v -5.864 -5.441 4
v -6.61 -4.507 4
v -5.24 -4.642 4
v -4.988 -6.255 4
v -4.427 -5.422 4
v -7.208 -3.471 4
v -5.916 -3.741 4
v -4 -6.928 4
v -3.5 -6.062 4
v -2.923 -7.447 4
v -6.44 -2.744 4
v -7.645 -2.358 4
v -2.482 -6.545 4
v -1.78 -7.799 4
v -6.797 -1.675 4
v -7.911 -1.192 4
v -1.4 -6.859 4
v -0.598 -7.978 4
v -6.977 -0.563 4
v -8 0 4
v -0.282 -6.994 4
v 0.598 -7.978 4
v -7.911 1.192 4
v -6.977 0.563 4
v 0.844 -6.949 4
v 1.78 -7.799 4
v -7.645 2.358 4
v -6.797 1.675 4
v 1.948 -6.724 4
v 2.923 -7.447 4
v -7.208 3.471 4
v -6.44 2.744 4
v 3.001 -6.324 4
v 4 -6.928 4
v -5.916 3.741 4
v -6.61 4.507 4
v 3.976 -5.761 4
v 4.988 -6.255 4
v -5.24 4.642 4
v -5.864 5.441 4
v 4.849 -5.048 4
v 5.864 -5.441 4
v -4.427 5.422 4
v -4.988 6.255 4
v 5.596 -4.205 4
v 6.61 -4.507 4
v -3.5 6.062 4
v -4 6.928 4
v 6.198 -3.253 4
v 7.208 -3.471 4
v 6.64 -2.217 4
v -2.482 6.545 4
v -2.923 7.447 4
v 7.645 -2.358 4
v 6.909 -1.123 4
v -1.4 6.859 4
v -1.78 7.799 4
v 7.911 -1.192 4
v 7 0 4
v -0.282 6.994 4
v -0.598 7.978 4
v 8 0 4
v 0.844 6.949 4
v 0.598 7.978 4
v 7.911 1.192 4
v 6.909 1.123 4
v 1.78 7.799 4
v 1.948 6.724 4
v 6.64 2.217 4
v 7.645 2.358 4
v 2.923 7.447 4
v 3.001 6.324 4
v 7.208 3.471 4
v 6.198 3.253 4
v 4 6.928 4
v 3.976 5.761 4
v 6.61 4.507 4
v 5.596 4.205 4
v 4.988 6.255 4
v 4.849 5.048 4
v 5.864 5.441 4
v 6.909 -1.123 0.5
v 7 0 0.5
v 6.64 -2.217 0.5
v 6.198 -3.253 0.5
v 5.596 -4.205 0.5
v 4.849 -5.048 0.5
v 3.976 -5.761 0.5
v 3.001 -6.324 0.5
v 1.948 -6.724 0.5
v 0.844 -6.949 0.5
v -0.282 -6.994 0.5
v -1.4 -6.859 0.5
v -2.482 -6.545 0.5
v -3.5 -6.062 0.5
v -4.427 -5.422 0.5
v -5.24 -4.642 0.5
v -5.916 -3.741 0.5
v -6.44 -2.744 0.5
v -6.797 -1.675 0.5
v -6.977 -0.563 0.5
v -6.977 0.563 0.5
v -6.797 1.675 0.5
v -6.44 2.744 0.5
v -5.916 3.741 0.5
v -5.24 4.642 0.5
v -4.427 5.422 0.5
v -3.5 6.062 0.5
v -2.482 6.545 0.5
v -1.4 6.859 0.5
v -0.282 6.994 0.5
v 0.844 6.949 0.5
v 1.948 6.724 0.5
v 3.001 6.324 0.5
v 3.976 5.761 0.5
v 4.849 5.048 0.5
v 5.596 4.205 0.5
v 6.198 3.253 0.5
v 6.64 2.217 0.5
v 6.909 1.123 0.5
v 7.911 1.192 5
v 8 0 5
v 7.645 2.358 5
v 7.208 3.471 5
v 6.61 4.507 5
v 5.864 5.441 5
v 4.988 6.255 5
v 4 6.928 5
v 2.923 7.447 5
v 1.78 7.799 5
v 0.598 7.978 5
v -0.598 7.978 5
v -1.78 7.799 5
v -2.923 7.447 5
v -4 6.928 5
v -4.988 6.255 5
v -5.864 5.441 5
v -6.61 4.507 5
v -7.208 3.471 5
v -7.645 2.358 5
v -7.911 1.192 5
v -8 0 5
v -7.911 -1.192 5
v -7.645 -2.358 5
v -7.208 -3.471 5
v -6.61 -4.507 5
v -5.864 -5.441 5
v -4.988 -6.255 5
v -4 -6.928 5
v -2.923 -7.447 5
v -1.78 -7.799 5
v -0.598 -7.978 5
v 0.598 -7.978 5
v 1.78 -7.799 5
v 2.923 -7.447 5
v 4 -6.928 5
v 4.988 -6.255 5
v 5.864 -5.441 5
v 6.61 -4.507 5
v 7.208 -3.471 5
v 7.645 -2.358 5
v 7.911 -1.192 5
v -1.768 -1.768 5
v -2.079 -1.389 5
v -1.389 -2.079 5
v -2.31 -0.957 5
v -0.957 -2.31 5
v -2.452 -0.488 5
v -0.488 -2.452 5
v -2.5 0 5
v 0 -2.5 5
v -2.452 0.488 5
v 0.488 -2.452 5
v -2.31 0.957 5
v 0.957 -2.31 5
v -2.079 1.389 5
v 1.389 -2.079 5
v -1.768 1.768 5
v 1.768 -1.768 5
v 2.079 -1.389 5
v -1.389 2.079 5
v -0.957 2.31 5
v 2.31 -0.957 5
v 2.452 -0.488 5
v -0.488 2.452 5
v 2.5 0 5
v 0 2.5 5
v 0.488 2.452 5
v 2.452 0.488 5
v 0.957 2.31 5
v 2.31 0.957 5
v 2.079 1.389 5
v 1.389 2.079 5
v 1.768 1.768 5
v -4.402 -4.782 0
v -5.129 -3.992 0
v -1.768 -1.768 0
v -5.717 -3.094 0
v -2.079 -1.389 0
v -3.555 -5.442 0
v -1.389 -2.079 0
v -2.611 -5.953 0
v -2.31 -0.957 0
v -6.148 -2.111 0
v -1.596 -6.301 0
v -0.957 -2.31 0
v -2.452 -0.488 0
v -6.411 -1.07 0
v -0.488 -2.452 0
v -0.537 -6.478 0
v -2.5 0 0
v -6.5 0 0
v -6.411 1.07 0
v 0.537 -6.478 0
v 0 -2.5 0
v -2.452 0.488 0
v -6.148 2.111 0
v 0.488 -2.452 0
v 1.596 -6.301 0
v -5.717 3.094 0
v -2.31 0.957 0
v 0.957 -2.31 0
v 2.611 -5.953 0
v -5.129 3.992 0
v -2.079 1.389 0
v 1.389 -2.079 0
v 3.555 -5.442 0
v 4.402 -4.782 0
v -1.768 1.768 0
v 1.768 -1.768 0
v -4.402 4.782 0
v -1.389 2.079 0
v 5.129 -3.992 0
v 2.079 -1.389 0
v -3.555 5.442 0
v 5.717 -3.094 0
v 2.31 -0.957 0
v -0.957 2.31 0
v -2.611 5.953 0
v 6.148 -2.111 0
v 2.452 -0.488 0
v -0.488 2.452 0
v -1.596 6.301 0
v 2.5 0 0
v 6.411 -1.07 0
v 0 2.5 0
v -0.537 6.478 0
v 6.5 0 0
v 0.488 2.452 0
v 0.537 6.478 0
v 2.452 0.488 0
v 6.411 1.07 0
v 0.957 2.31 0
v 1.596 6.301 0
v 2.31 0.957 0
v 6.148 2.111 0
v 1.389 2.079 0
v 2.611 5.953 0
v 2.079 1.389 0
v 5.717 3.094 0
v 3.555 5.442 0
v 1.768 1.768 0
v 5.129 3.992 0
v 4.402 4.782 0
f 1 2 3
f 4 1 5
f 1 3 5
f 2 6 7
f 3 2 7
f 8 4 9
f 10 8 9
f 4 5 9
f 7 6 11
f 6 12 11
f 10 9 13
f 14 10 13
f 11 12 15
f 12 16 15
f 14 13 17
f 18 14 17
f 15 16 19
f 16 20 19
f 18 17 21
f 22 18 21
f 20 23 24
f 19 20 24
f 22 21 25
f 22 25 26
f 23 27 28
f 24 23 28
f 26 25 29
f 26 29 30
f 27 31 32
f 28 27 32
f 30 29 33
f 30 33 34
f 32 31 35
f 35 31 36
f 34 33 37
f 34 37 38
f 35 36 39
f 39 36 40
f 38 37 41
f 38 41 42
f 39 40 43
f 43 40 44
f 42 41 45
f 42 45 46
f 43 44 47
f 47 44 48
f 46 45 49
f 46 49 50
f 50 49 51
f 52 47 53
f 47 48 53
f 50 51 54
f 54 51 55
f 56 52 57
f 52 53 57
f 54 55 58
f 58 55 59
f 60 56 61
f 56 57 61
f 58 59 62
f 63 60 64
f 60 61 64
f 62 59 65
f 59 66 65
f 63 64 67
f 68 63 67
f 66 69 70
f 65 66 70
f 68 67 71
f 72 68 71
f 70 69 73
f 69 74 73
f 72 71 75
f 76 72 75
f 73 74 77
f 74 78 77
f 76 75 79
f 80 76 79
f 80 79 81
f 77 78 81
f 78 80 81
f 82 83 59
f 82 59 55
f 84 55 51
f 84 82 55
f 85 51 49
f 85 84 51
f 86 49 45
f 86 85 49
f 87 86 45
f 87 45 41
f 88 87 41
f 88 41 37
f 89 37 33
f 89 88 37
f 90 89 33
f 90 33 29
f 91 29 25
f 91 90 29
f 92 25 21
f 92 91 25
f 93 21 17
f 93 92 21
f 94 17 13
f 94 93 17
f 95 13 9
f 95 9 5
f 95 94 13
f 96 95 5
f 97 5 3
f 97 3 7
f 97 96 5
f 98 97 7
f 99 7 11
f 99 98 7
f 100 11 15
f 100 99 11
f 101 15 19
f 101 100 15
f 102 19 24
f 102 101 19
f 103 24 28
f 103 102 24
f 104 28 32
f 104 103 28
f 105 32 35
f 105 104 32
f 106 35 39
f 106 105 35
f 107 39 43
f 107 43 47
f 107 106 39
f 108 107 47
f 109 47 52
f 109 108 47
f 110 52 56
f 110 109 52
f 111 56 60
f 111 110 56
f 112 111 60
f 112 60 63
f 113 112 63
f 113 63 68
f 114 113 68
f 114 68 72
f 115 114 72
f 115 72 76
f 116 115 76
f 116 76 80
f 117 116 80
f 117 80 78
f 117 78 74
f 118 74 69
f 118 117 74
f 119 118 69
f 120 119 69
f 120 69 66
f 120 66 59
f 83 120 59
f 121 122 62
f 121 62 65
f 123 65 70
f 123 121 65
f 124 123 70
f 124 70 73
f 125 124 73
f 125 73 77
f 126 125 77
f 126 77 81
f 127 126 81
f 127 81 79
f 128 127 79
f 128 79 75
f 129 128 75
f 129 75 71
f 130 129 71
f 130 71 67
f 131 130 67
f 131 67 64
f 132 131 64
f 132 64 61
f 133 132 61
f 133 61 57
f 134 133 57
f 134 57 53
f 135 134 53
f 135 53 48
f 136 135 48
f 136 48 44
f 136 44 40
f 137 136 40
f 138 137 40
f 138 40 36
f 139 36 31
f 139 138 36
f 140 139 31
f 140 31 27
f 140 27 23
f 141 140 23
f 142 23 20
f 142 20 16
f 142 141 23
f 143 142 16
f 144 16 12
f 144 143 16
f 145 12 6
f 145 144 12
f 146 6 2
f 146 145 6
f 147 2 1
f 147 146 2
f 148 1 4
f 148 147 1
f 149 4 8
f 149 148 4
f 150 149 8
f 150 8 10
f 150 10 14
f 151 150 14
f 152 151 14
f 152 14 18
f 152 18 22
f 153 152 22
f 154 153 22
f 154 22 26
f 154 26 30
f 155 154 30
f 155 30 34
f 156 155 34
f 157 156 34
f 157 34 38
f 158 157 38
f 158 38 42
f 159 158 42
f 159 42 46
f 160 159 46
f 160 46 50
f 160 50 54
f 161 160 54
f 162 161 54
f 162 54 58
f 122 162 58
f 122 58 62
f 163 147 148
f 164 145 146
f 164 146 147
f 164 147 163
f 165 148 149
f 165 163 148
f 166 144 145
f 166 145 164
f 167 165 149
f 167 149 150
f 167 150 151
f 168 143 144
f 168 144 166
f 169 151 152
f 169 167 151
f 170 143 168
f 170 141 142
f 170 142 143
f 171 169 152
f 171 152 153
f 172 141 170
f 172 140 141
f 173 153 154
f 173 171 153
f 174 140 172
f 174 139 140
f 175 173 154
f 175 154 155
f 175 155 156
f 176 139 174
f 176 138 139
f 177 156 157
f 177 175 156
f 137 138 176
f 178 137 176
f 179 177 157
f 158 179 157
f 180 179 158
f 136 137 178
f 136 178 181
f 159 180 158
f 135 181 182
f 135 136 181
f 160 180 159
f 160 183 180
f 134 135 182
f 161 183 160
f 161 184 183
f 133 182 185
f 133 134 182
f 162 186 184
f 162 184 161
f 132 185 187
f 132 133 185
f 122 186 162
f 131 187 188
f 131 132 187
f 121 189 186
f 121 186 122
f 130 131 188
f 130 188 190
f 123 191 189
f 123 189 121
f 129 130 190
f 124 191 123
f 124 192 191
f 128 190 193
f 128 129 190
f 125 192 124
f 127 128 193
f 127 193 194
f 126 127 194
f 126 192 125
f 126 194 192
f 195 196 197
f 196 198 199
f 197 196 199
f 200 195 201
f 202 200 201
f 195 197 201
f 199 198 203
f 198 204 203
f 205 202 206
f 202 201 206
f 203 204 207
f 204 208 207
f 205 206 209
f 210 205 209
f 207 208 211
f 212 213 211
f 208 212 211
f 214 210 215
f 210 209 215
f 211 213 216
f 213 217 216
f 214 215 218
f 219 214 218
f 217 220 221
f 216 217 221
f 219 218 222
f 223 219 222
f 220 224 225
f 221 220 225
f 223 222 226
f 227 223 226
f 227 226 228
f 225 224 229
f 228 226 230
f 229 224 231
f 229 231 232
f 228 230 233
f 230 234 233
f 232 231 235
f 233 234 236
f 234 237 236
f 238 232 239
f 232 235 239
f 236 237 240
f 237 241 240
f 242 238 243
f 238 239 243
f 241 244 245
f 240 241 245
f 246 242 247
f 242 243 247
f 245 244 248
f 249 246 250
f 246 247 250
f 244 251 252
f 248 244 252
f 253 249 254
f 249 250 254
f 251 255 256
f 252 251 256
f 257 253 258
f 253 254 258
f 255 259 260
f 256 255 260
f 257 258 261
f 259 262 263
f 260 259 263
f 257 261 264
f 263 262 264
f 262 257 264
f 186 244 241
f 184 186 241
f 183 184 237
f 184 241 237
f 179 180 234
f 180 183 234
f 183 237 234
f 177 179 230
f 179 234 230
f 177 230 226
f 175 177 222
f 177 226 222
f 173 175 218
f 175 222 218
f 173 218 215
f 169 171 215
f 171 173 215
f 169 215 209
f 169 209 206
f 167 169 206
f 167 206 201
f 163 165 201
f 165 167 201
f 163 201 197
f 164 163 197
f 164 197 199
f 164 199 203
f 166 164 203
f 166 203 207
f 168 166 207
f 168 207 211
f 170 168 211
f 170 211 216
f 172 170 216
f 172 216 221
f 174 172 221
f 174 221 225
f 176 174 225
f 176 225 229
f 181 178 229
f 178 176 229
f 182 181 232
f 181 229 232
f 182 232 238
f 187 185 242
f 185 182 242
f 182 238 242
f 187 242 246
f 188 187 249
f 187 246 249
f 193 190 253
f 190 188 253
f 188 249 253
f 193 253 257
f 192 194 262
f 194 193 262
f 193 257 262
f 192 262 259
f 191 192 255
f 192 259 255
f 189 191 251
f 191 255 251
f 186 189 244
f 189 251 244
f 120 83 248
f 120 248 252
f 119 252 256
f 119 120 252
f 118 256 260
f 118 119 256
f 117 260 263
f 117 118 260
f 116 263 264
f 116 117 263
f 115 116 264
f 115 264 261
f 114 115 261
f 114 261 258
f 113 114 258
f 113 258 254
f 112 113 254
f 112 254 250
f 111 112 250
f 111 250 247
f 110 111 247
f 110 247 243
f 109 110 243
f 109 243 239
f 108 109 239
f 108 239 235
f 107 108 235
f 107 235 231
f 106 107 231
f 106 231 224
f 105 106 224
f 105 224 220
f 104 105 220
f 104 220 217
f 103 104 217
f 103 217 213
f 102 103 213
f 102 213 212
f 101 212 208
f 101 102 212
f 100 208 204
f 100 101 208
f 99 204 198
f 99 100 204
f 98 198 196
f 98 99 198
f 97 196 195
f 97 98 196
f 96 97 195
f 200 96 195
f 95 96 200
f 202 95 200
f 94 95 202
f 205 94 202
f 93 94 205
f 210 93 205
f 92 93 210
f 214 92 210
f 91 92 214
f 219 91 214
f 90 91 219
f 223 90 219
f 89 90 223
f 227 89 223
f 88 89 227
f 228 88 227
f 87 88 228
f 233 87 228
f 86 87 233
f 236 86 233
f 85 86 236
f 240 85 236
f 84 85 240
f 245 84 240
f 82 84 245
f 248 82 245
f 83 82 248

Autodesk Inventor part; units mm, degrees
ref_plane "YZ Plane" through (0, 0, 0) normal (1, 0, 0) x (0, 1, 0)
ref_plane "XZ Plane" through (0, 0, 0) normal (0, 1, 0) x (-1, 0, 0)
ref_plane "XY Plane" through (0, 0, 0) normal (0, 0, 1) x (1, 0, 0)
sketch "Sketch1" plane through (0, 0, 0) normal (0, 0, 1) x (1, 0, 0)
  circle A0 centre (0, 0) radius 5.0674 projected
  circle A1 centre (0, 0) radius 2.5
  circle A2 centre (0, 0) radius 7
  point P0 (0, 0)
  dimension "d0" = 5
  dimension "d1" = 14
extrude "Extrusion1" add sketch "Sketch1" along normal blind 5 contours A0 | A2
sketch "Sketch2" plane through (0, 0, 5) normal (0, 0, 1) x (1, 0, 0)
  circle A0 centre (0, 0) radius 2.5931
  circle A1 centre (0, 0) radius 2.5 projected
  circle A2 centre (0, 0) radius 8
  dimension "d4" = 16
extrude "Extrusion2" add sketch "Sketch2" against normal blind 1 contours A2
chamfer "Chamfer1" distance 0.5 angle 45 1 edges at (-7, 0, 0)
properties part number "Flanged Bearing"
